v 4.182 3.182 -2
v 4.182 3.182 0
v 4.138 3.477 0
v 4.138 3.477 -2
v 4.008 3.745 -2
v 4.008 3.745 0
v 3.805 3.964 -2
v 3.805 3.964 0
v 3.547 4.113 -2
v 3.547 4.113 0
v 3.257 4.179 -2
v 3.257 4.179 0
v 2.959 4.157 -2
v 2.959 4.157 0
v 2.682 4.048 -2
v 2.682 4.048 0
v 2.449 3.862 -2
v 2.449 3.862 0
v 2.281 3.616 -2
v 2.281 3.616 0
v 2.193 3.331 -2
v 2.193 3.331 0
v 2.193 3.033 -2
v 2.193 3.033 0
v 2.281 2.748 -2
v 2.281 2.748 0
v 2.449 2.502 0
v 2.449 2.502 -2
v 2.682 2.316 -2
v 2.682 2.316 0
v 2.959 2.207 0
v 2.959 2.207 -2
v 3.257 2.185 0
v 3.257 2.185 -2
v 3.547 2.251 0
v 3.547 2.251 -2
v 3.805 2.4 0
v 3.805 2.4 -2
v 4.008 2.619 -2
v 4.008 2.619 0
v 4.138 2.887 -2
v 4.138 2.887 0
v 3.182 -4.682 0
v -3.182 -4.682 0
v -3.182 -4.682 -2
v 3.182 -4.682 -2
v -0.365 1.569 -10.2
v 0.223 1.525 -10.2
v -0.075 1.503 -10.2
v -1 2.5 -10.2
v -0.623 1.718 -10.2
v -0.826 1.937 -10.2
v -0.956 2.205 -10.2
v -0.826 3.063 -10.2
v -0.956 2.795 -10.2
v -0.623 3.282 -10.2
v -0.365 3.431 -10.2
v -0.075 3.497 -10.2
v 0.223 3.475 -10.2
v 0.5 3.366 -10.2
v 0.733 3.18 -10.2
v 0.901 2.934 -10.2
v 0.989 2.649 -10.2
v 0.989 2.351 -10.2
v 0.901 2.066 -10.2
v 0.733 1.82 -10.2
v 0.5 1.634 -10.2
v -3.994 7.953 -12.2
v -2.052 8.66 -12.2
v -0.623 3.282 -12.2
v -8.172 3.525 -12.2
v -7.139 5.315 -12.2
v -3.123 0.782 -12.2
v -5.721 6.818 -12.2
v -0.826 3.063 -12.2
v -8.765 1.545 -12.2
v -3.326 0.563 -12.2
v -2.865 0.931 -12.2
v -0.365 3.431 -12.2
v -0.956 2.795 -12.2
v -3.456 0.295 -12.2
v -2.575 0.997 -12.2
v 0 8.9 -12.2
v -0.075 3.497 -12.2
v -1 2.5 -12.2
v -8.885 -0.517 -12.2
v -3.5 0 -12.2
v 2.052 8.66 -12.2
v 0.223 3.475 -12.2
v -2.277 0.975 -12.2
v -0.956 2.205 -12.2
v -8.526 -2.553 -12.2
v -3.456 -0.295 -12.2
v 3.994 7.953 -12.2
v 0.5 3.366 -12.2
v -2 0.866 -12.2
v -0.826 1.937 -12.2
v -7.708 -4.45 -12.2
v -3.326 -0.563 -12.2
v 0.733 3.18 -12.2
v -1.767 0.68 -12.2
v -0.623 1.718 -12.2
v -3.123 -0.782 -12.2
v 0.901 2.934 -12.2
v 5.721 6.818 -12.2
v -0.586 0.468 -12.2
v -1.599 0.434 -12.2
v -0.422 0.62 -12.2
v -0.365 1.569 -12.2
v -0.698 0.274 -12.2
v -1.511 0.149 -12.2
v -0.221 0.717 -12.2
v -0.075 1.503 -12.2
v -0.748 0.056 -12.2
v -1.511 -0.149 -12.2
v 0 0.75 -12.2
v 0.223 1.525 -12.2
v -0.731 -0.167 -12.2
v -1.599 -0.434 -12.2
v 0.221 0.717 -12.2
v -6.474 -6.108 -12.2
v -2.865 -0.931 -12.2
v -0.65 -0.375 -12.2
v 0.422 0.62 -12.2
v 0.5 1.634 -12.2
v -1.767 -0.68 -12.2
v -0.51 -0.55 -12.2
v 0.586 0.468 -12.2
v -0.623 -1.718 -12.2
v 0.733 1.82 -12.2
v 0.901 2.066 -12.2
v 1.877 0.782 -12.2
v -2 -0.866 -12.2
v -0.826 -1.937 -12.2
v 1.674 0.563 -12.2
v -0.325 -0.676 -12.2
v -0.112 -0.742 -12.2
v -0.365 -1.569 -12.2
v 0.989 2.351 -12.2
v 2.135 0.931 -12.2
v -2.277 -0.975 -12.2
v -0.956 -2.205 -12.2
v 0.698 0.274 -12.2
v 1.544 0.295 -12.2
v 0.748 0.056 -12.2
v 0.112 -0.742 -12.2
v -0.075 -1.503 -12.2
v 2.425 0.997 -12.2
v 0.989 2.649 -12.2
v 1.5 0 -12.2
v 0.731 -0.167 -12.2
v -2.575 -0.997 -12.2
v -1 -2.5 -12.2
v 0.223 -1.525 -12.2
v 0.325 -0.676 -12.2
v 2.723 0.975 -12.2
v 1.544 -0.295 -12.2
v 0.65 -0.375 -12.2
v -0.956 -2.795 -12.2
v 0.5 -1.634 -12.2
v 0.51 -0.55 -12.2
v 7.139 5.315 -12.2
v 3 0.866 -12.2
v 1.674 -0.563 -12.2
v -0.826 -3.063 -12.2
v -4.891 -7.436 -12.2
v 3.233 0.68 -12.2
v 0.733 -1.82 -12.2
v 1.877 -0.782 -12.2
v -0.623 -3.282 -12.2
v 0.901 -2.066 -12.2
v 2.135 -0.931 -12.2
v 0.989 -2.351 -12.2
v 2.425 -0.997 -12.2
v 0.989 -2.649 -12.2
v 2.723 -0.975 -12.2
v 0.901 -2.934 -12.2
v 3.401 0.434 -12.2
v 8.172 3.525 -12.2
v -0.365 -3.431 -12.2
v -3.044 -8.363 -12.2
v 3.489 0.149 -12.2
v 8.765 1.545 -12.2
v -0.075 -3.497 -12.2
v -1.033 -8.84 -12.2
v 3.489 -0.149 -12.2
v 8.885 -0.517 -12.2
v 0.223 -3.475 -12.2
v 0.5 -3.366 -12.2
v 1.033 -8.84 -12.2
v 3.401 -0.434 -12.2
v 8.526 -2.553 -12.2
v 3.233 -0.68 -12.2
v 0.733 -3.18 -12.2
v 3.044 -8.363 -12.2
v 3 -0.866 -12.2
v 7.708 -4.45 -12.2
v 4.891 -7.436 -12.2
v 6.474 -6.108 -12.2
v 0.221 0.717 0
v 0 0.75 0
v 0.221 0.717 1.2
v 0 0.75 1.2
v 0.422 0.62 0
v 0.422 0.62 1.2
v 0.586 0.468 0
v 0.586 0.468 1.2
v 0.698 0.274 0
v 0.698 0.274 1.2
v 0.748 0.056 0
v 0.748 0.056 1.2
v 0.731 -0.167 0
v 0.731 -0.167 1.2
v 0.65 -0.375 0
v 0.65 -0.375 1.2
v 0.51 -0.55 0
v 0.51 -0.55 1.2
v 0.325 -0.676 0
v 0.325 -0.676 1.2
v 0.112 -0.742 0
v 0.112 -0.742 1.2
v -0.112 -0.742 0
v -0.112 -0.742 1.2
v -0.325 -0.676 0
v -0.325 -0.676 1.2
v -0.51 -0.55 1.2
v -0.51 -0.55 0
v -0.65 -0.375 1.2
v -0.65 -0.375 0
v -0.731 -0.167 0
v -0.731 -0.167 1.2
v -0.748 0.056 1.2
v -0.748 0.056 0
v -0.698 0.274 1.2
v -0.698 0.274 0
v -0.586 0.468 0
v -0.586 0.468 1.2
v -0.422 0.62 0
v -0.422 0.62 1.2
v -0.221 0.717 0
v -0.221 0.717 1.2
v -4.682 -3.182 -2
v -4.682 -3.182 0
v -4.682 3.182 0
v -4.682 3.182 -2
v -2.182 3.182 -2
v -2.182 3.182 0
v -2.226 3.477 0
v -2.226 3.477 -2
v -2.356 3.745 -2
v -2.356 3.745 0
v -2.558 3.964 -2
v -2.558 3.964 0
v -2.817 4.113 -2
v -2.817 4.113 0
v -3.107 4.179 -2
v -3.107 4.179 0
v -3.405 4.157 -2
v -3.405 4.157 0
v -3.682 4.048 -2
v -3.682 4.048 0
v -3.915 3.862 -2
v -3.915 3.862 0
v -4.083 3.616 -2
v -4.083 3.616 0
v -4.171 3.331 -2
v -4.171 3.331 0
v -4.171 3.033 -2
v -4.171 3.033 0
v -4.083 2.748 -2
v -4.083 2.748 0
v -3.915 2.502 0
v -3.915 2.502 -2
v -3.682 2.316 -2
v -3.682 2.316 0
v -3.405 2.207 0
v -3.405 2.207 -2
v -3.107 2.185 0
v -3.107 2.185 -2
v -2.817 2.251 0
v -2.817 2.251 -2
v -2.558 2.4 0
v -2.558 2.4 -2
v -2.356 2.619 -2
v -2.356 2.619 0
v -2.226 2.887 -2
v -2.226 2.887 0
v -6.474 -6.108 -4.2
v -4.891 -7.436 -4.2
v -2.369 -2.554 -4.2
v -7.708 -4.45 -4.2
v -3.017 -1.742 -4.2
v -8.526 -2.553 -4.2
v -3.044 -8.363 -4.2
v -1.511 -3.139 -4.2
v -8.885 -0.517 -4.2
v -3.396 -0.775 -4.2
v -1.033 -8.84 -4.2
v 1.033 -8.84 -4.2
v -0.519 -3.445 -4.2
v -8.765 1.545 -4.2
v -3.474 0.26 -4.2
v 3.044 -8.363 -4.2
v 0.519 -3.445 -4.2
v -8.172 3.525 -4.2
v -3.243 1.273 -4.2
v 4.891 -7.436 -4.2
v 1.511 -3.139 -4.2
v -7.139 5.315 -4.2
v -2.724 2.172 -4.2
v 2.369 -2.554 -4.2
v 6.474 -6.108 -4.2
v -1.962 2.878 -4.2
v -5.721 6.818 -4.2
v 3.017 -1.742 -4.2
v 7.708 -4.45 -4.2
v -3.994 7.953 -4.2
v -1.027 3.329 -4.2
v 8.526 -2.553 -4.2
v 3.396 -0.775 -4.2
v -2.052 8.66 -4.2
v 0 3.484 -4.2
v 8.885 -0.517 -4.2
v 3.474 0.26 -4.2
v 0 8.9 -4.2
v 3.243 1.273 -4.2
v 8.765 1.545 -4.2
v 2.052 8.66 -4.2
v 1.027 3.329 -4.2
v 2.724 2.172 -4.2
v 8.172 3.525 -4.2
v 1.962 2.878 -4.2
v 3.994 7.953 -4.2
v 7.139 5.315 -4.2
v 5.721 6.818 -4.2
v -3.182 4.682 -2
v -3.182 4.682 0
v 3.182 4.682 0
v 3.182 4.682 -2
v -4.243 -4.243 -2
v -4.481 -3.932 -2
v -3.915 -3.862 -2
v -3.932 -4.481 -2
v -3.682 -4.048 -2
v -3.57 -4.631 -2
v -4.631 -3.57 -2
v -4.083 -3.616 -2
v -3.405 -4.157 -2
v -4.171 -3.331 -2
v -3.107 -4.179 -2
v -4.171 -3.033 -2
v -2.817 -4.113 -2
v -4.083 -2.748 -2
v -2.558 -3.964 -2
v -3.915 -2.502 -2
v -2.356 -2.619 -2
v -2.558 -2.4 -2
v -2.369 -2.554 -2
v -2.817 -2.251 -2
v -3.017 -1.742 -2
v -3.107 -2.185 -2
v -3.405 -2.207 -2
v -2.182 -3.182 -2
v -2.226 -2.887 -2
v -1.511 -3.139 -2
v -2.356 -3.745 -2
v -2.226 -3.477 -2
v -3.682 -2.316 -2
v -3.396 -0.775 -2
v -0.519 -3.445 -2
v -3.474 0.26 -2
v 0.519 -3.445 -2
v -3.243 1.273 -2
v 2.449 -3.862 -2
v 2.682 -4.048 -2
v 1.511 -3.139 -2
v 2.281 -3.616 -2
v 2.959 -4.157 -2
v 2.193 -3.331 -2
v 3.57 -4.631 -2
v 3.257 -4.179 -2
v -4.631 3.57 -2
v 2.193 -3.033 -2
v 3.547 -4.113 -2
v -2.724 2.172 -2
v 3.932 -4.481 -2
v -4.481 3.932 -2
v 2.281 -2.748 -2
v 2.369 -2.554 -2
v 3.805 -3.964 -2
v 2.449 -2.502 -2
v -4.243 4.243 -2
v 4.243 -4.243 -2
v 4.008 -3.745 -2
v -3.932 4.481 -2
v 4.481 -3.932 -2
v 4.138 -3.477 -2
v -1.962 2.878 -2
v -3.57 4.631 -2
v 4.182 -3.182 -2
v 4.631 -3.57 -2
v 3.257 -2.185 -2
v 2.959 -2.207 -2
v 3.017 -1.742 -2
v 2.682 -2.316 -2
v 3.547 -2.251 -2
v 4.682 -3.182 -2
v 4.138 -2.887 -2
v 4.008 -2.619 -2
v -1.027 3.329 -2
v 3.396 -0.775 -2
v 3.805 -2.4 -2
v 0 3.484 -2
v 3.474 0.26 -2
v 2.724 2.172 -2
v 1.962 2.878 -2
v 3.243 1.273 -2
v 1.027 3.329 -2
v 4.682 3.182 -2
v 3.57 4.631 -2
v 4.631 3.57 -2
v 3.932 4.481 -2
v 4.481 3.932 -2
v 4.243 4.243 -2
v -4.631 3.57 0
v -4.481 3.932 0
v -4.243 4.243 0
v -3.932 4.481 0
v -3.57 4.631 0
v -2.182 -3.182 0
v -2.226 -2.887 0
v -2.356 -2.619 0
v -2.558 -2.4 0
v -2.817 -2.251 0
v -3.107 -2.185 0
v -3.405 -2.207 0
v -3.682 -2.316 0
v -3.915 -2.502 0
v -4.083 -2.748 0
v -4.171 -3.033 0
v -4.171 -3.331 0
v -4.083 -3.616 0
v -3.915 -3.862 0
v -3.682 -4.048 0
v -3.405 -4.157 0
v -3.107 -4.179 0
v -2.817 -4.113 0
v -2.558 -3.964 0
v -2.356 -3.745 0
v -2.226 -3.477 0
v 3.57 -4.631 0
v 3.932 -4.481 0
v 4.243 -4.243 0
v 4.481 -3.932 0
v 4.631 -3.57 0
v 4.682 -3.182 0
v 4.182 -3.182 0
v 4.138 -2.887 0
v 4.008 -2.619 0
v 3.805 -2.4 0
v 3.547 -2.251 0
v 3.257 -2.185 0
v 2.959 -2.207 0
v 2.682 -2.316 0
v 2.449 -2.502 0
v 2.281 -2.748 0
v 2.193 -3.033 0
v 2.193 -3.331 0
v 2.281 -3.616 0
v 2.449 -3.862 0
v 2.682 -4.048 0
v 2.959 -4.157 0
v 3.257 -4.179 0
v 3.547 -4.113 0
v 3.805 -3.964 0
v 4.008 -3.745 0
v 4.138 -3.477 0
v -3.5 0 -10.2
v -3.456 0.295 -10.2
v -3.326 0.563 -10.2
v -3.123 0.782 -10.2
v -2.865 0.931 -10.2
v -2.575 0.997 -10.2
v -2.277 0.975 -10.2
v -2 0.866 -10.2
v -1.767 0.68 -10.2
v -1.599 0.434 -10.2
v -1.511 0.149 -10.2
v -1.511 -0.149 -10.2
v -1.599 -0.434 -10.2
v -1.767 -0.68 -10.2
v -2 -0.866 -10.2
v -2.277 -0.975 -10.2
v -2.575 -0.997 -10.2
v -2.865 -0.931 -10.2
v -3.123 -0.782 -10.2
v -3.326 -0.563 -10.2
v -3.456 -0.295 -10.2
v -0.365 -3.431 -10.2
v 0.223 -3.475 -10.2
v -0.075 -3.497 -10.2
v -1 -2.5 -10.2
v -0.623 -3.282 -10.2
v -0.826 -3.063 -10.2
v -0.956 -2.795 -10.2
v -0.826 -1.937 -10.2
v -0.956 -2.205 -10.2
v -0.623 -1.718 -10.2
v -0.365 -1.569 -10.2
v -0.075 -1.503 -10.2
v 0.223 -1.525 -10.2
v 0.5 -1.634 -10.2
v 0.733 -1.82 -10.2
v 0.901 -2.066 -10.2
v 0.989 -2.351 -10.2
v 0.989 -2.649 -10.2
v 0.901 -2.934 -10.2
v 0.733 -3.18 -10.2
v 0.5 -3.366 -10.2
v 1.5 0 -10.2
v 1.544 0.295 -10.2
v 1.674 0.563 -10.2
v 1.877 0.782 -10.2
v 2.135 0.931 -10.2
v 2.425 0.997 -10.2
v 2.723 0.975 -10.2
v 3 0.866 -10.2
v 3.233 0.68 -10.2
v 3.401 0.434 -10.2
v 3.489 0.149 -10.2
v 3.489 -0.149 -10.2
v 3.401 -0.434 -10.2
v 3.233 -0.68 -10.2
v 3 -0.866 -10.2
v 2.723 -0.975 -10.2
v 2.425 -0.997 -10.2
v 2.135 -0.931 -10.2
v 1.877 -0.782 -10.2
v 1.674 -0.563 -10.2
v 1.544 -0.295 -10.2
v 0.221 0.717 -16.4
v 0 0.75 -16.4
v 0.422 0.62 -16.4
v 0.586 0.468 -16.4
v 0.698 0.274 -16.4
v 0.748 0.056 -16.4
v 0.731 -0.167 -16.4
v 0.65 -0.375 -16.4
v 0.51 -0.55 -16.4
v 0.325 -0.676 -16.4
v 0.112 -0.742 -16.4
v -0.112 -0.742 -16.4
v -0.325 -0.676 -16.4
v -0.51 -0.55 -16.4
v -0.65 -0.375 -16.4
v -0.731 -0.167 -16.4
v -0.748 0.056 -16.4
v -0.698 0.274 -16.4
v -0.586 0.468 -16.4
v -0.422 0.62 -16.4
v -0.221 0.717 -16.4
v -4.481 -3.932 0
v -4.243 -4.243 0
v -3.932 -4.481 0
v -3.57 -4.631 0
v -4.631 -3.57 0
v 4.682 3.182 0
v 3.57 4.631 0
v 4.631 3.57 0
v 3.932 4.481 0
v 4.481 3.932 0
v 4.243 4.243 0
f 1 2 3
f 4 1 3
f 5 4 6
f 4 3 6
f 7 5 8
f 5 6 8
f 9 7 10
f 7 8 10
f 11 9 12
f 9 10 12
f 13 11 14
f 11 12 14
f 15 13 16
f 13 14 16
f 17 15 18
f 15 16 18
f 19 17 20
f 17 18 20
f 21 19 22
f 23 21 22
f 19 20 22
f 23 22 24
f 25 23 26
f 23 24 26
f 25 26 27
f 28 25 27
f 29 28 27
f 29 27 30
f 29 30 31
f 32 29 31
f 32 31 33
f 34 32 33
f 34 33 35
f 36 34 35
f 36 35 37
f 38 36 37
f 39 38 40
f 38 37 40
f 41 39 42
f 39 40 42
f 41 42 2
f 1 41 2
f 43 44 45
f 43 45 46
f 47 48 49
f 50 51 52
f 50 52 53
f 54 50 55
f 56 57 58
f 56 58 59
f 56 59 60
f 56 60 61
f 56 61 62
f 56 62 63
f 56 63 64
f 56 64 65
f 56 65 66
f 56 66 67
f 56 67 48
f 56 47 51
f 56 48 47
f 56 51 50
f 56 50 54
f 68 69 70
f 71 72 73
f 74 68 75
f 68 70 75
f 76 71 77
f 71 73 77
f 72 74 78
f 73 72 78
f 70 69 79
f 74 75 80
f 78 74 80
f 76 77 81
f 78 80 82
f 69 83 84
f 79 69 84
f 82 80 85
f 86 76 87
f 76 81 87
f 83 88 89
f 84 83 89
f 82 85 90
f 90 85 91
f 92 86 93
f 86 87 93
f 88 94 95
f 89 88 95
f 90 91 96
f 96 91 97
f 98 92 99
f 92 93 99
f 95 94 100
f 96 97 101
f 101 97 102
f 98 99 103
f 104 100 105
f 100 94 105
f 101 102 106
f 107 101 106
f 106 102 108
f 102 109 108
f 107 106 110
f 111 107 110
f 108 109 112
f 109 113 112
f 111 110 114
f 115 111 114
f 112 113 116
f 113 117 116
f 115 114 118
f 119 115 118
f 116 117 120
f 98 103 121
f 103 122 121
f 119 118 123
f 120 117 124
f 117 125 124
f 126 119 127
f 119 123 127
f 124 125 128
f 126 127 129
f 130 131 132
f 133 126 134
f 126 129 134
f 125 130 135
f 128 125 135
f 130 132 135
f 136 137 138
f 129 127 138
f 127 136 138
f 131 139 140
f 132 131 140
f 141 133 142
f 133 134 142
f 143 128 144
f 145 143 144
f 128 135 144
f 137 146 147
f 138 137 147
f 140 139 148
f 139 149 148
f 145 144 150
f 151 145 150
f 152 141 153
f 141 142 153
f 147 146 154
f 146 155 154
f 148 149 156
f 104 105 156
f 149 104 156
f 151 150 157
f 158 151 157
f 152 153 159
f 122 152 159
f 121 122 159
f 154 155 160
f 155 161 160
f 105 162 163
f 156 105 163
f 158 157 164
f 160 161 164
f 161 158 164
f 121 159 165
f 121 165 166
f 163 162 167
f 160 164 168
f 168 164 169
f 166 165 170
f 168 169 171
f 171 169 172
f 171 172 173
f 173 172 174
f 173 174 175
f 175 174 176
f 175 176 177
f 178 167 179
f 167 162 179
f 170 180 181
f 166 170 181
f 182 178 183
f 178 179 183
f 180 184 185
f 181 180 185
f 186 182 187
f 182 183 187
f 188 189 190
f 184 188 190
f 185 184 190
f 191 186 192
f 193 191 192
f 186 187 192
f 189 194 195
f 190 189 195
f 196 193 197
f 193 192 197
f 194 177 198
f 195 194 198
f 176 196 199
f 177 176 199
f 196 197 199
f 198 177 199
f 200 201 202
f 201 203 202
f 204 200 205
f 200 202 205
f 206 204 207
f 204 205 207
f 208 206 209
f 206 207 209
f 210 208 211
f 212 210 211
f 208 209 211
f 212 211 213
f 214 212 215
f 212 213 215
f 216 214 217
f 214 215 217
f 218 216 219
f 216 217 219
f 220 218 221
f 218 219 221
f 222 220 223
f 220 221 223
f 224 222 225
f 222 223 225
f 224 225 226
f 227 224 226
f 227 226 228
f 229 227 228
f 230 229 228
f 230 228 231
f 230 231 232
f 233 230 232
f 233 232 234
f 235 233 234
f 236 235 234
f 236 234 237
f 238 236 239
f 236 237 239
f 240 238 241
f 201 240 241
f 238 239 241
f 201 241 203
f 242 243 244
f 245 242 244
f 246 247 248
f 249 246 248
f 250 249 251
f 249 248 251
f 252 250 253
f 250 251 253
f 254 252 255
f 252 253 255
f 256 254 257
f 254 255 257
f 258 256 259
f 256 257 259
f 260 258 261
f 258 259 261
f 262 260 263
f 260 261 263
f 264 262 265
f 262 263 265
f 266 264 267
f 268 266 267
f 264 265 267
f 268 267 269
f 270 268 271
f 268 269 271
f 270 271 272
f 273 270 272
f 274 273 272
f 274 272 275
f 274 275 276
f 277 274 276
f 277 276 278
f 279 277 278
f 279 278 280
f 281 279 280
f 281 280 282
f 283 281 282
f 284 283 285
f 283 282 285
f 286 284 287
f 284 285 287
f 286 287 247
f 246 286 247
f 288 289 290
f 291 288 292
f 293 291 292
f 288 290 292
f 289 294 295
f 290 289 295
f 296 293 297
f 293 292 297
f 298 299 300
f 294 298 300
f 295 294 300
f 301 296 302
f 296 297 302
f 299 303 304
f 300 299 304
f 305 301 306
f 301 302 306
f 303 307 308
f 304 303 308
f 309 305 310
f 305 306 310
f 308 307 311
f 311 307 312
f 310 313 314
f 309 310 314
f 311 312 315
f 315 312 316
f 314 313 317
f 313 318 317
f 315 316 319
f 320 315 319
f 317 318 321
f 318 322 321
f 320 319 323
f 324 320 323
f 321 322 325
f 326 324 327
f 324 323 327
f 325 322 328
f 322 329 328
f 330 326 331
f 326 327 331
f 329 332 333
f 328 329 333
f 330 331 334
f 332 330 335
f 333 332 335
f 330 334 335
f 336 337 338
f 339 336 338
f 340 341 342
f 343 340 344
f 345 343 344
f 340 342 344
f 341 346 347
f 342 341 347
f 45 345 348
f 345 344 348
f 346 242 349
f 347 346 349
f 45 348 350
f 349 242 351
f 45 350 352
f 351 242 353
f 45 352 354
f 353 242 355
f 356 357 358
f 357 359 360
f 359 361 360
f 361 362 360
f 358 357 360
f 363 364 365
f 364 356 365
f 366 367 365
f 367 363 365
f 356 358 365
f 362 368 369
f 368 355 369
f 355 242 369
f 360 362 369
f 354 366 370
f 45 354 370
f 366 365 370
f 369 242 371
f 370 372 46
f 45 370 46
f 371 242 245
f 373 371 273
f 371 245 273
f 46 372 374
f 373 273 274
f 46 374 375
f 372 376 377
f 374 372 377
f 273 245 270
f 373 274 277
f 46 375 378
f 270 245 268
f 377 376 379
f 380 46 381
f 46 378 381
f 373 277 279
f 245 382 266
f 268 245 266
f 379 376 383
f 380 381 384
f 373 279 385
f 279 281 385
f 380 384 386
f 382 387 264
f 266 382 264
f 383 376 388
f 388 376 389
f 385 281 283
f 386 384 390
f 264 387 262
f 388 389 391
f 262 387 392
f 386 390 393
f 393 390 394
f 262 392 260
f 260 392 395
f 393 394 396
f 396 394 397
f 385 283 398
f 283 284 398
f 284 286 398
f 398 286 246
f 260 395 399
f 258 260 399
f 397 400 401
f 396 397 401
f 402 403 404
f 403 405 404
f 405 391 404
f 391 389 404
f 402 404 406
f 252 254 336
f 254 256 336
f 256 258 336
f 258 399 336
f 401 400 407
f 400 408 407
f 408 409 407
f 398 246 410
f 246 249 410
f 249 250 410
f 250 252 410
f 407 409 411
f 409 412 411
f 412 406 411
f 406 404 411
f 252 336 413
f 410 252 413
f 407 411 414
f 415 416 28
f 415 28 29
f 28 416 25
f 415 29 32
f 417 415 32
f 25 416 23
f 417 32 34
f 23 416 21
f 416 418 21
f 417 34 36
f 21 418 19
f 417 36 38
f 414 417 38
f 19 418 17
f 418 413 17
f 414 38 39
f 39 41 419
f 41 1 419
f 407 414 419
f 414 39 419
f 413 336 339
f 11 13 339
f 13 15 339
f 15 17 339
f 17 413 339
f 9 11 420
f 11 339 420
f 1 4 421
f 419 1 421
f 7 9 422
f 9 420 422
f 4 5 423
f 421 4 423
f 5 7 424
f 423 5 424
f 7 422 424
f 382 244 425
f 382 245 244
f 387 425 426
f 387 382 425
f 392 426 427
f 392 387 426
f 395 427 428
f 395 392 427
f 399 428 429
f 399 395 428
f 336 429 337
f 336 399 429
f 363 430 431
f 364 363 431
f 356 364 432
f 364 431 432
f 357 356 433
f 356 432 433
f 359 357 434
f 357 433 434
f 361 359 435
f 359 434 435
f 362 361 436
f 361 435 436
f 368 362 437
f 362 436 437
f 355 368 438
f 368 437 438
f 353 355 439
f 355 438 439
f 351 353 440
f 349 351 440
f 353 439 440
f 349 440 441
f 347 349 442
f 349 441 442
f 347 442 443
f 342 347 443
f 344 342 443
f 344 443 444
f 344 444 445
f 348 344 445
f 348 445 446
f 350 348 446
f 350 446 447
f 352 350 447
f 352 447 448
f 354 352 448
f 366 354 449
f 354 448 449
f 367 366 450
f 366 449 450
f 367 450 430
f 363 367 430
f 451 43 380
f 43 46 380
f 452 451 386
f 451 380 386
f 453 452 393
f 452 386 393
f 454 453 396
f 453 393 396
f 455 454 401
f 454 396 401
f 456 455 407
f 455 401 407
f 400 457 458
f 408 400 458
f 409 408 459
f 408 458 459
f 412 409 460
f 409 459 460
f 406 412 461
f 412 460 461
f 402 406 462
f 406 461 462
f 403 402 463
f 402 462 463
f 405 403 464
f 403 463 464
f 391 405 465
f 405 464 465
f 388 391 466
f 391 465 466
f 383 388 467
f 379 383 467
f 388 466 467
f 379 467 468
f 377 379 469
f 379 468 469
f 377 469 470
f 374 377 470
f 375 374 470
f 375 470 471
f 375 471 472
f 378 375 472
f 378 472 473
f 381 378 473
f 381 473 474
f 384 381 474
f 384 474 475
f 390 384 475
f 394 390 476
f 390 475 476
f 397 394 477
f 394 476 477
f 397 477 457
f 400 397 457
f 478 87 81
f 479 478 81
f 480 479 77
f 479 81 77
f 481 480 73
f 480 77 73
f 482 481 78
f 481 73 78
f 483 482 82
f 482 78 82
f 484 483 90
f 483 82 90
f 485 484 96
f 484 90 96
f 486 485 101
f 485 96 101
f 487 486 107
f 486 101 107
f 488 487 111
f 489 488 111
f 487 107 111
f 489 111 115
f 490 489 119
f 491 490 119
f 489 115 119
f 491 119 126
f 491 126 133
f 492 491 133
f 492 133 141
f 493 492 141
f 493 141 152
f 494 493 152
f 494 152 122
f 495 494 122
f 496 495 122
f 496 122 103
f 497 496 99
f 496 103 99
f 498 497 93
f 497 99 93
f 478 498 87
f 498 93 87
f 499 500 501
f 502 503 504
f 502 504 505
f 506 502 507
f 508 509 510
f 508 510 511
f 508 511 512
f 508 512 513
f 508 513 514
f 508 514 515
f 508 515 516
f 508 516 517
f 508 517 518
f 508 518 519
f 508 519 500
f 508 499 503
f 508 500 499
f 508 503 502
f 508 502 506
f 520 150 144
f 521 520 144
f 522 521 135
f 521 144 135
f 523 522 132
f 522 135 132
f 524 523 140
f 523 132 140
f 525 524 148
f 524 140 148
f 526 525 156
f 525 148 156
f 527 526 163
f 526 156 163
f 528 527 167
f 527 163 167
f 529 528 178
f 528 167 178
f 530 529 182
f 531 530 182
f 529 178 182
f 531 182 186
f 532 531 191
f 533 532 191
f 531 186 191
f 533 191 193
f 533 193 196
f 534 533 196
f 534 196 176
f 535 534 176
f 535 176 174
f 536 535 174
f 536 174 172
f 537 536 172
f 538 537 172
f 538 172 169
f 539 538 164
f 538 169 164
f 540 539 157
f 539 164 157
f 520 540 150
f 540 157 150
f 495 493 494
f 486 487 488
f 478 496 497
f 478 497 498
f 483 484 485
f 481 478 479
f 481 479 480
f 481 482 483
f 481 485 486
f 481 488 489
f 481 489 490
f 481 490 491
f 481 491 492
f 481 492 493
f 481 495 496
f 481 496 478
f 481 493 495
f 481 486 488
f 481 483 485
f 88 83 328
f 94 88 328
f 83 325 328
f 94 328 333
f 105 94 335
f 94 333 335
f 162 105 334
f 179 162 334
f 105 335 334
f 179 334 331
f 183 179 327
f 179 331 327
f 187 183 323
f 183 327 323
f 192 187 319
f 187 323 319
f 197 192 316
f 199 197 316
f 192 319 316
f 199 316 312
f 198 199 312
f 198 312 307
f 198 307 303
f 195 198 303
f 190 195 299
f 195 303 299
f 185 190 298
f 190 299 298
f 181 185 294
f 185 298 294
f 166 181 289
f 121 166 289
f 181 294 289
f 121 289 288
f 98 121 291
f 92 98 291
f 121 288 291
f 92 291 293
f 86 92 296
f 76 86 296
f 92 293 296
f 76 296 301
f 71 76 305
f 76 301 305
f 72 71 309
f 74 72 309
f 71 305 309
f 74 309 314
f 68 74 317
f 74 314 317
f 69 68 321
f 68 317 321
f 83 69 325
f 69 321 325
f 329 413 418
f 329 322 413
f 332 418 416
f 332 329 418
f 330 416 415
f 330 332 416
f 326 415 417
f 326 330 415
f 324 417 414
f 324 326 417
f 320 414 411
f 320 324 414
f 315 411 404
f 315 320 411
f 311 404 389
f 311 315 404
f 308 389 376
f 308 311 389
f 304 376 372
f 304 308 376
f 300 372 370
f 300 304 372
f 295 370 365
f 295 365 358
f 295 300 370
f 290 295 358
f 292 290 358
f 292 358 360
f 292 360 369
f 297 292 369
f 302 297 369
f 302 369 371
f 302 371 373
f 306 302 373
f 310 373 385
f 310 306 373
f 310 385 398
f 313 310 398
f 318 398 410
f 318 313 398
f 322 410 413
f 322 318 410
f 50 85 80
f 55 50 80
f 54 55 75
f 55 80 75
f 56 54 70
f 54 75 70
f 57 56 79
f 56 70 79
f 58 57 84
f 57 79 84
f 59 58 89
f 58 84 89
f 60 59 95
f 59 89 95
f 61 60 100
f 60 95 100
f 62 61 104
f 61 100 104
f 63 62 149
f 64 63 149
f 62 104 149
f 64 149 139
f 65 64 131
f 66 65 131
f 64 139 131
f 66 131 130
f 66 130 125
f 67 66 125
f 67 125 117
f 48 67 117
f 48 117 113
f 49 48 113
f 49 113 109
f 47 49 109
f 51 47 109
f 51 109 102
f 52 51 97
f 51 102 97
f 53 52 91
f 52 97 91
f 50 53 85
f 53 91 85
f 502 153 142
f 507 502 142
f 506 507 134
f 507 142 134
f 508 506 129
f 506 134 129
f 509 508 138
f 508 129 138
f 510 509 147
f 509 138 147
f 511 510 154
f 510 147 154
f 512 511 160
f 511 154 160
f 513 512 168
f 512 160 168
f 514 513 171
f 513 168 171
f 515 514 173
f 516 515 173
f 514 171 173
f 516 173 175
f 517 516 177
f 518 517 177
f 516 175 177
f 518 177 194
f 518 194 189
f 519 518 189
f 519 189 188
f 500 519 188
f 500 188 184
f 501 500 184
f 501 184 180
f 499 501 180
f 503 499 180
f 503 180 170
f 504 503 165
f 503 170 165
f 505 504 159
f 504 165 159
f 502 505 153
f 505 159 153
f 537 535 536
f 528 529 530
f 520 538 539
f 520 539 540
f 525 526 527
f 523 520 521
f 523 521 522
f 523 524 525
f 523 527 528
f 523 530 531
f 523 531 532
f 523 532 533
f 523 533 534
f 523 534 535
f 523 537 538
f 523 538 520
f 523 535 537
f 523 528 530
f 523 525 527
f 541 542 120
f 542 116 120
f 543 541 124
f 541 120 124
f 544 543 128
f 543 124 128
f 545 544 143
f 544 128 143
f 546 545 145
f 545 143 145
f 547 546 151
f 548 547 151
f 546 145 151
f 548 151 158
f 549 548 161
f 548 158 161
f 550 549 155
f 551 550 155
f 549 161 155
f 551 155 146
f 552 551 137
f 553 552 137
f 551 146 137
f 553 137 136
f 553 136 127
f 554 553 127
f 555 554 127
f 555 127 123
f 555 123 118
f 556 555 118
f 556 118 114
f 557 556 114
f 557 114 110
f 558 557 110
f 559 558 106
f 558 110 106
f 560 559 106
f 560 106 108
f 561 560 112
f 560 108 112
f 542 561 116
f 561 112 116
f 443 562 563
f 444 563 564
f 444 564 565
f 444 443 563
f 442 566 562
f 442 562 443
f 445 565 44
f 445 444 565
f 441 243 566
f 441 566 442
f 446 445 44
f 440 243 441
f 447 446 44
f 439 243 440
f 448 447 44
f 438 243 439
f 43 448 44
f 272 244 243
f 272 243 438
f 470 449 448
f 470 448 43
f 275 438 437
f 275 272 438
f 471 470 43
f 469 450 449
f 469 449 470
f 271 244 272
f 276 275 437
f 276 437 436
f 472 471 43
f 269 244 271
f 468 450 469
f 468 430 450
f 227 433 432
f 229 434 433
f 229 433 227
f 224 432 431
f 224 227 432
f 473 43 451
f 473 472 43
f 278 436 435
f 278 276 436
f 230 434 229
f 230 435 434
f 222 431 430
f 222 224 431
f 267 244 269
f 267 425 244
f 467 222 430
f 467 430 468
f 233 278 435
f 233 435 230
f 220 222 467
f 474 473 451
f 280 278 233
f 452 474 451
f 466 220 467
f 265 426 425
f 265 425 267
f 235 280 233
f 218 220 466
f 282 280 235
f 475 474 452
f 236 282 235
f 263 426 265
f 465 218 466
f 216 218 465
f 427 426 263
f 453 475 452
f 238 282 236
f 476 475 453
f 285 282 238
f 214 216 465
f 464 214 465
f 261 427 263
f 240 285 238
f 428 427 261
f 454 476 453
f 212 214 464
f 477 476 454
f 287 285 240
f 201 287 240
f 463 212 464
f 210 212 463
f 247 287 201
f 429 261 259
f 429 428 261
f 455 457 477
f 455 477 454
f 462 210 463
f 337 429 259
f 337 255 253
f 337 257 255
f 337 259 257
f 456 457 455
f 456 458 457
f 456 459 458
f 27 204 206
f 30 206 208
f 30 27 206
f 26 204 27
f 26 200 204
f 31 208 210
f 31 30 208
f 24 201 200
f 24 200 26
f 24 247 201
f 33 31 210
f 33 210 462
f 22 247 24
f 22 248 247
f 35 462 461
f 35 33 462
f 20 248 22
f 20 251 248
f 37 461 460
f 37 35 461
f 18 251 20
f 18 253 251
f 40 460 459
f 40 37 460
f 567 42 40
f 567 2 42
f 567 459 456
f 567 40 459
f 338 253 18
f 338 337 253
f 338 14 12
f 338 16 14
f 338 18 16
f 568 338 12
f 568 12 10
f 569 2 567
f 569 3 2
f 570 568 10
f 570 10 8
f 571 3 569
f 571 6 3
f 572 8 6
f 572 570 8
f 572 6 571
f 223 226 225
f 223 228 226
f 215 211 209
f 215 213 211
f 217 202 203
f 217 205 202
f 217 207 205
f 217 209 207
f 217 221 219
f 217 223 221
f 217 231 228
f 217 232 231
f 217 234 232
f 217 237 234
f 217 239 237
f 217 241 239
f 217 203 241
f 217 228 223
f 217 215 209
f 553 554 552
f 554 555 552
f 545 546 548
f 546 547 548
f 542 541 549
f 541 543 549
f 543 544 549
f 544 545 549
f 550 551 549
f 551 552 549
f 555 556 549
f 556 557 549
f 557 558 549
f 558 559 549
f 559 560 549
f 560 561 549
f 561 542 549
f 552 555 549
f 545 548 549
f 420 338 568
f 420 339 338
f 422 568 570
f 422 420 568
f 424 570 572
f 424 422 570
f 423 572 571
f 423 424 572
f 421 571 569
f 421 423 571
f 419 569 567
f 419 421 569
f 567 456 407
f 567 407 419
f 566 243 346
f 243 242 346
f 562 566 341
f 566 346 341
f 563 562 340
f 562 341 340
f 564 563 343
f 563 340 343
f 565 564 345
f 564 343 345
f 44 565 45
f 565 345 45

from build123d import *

# Parameters (mm, degrees)
SKETCH1_W           = 1.2
SKETCH1_H           = 0.75
SKETCH1_W_2         = 4.2
SKETCH1_W_3         = 8
SKETCH1_H_2         = 2.733563445
SKETCH2_W           = 9.36396103
SKETCH2_H           = 9.36396103
SKETCH2_R           = 1
BOSS_EXTRUDE1_DEPTH = 2
FILLET1_R           = 1.5
SKETCH3_R           = 1
CUT_EXTRUDE1_DEPTH  = 2


with BuildPart() as part:
    # Sketch1 → Revolve1 (revolve)
    with BuildSketch(Plane(origin=(0, 0, 0), x_dir=(0, 0, -1), z_dir=(1, 0, 0))):
        with Locations((-0.6, 0.375)):
            Rectangle(SKETCH1_W, SKETCH1_H)
        with Locations((2.1, 0.375)):
            Rectangle(SKETCH1_W_2, SKETCH1_H)
        with Locations((8.2, 0.375)):
            Rectangle(SKETCH1_W_3, SKETCH1_H)
        with Locations((14.3, 0.375)):
            Rectangle(SKETCH1_W_2, SKETCH1_H)
        Polygon((4.2, 3.483563445), (4.2, 0.75), (12.2, 0.75), (12.2, 8.9), (4.2, 8.9), align=None)
        with Locations((2.1, 2.116781722)):
            Rectangle(SKETCH1_W_2, SKETCH1_H_2)
    revolve(axis=Axis((0, 0, 1.2), (0, 0, -1)))

    # Sketch2 → Boss-Extrude1 (add)
    with BuildSketch(Plane.XY):
        Rectangle(SKETCH2_W, SKETCH2_H)
        with Locations((3.181980515, 3.181980515)):
            Circle(SKETCH2_R, mode=Mode.SUBTRACT)
        with Locations((3.181980515, -3.181980515)):
            Circle(SKETCH2_R, mode=Mode.SUBTRACT)
        with Locations((-3.181980515, -3.181980515)):
            Circle(SKETCH2_R, mode=Mode.SUBTRACT)
        with Locations((-3.181980515, 3.181980515)):
            Circle(SKETCH2_R, mode=Mode.SUBTRACT)
    extrude(amount=-BOSS_EXTRUDE1_DEPTH)

    # Fillet1
    fillet1_edges = [part.edges().sort_by_distance(p)[0] for p in [
        (4.681980515, 4.681980515, -1),
        (4.681980515, -4.681980515, -1),
        (-4.681980515, -4.681980515, -1),
        (-4.681980515, 4.681980515, -1),
    ]]
    fillet(fillet1_edges, radius=FILLET1_R)

    # Sketch3 → Cut-Extrude1 (cut)
    with BuildSketch(Plane(origin=(0, 0, -12.2), x_dir=(-1, 0, 0), z_dir=(0, 0, -1))):
        with Locations((0, 2.5)):
            Circle(SKETCH3_R)
        with Locations((2.5, 0)):
            Circle(SKETCH3_R)
        with Locations((0, -2.5)):
            Circle(SKETCH3_R)
        with Locations((-2.5, 0)):
            Circle(SKETCH3_R)
    extrude(amount=-CUT_EXTRUDE1_DEPTH, mode=Mode.SUBTRACT)


solid = part.part
